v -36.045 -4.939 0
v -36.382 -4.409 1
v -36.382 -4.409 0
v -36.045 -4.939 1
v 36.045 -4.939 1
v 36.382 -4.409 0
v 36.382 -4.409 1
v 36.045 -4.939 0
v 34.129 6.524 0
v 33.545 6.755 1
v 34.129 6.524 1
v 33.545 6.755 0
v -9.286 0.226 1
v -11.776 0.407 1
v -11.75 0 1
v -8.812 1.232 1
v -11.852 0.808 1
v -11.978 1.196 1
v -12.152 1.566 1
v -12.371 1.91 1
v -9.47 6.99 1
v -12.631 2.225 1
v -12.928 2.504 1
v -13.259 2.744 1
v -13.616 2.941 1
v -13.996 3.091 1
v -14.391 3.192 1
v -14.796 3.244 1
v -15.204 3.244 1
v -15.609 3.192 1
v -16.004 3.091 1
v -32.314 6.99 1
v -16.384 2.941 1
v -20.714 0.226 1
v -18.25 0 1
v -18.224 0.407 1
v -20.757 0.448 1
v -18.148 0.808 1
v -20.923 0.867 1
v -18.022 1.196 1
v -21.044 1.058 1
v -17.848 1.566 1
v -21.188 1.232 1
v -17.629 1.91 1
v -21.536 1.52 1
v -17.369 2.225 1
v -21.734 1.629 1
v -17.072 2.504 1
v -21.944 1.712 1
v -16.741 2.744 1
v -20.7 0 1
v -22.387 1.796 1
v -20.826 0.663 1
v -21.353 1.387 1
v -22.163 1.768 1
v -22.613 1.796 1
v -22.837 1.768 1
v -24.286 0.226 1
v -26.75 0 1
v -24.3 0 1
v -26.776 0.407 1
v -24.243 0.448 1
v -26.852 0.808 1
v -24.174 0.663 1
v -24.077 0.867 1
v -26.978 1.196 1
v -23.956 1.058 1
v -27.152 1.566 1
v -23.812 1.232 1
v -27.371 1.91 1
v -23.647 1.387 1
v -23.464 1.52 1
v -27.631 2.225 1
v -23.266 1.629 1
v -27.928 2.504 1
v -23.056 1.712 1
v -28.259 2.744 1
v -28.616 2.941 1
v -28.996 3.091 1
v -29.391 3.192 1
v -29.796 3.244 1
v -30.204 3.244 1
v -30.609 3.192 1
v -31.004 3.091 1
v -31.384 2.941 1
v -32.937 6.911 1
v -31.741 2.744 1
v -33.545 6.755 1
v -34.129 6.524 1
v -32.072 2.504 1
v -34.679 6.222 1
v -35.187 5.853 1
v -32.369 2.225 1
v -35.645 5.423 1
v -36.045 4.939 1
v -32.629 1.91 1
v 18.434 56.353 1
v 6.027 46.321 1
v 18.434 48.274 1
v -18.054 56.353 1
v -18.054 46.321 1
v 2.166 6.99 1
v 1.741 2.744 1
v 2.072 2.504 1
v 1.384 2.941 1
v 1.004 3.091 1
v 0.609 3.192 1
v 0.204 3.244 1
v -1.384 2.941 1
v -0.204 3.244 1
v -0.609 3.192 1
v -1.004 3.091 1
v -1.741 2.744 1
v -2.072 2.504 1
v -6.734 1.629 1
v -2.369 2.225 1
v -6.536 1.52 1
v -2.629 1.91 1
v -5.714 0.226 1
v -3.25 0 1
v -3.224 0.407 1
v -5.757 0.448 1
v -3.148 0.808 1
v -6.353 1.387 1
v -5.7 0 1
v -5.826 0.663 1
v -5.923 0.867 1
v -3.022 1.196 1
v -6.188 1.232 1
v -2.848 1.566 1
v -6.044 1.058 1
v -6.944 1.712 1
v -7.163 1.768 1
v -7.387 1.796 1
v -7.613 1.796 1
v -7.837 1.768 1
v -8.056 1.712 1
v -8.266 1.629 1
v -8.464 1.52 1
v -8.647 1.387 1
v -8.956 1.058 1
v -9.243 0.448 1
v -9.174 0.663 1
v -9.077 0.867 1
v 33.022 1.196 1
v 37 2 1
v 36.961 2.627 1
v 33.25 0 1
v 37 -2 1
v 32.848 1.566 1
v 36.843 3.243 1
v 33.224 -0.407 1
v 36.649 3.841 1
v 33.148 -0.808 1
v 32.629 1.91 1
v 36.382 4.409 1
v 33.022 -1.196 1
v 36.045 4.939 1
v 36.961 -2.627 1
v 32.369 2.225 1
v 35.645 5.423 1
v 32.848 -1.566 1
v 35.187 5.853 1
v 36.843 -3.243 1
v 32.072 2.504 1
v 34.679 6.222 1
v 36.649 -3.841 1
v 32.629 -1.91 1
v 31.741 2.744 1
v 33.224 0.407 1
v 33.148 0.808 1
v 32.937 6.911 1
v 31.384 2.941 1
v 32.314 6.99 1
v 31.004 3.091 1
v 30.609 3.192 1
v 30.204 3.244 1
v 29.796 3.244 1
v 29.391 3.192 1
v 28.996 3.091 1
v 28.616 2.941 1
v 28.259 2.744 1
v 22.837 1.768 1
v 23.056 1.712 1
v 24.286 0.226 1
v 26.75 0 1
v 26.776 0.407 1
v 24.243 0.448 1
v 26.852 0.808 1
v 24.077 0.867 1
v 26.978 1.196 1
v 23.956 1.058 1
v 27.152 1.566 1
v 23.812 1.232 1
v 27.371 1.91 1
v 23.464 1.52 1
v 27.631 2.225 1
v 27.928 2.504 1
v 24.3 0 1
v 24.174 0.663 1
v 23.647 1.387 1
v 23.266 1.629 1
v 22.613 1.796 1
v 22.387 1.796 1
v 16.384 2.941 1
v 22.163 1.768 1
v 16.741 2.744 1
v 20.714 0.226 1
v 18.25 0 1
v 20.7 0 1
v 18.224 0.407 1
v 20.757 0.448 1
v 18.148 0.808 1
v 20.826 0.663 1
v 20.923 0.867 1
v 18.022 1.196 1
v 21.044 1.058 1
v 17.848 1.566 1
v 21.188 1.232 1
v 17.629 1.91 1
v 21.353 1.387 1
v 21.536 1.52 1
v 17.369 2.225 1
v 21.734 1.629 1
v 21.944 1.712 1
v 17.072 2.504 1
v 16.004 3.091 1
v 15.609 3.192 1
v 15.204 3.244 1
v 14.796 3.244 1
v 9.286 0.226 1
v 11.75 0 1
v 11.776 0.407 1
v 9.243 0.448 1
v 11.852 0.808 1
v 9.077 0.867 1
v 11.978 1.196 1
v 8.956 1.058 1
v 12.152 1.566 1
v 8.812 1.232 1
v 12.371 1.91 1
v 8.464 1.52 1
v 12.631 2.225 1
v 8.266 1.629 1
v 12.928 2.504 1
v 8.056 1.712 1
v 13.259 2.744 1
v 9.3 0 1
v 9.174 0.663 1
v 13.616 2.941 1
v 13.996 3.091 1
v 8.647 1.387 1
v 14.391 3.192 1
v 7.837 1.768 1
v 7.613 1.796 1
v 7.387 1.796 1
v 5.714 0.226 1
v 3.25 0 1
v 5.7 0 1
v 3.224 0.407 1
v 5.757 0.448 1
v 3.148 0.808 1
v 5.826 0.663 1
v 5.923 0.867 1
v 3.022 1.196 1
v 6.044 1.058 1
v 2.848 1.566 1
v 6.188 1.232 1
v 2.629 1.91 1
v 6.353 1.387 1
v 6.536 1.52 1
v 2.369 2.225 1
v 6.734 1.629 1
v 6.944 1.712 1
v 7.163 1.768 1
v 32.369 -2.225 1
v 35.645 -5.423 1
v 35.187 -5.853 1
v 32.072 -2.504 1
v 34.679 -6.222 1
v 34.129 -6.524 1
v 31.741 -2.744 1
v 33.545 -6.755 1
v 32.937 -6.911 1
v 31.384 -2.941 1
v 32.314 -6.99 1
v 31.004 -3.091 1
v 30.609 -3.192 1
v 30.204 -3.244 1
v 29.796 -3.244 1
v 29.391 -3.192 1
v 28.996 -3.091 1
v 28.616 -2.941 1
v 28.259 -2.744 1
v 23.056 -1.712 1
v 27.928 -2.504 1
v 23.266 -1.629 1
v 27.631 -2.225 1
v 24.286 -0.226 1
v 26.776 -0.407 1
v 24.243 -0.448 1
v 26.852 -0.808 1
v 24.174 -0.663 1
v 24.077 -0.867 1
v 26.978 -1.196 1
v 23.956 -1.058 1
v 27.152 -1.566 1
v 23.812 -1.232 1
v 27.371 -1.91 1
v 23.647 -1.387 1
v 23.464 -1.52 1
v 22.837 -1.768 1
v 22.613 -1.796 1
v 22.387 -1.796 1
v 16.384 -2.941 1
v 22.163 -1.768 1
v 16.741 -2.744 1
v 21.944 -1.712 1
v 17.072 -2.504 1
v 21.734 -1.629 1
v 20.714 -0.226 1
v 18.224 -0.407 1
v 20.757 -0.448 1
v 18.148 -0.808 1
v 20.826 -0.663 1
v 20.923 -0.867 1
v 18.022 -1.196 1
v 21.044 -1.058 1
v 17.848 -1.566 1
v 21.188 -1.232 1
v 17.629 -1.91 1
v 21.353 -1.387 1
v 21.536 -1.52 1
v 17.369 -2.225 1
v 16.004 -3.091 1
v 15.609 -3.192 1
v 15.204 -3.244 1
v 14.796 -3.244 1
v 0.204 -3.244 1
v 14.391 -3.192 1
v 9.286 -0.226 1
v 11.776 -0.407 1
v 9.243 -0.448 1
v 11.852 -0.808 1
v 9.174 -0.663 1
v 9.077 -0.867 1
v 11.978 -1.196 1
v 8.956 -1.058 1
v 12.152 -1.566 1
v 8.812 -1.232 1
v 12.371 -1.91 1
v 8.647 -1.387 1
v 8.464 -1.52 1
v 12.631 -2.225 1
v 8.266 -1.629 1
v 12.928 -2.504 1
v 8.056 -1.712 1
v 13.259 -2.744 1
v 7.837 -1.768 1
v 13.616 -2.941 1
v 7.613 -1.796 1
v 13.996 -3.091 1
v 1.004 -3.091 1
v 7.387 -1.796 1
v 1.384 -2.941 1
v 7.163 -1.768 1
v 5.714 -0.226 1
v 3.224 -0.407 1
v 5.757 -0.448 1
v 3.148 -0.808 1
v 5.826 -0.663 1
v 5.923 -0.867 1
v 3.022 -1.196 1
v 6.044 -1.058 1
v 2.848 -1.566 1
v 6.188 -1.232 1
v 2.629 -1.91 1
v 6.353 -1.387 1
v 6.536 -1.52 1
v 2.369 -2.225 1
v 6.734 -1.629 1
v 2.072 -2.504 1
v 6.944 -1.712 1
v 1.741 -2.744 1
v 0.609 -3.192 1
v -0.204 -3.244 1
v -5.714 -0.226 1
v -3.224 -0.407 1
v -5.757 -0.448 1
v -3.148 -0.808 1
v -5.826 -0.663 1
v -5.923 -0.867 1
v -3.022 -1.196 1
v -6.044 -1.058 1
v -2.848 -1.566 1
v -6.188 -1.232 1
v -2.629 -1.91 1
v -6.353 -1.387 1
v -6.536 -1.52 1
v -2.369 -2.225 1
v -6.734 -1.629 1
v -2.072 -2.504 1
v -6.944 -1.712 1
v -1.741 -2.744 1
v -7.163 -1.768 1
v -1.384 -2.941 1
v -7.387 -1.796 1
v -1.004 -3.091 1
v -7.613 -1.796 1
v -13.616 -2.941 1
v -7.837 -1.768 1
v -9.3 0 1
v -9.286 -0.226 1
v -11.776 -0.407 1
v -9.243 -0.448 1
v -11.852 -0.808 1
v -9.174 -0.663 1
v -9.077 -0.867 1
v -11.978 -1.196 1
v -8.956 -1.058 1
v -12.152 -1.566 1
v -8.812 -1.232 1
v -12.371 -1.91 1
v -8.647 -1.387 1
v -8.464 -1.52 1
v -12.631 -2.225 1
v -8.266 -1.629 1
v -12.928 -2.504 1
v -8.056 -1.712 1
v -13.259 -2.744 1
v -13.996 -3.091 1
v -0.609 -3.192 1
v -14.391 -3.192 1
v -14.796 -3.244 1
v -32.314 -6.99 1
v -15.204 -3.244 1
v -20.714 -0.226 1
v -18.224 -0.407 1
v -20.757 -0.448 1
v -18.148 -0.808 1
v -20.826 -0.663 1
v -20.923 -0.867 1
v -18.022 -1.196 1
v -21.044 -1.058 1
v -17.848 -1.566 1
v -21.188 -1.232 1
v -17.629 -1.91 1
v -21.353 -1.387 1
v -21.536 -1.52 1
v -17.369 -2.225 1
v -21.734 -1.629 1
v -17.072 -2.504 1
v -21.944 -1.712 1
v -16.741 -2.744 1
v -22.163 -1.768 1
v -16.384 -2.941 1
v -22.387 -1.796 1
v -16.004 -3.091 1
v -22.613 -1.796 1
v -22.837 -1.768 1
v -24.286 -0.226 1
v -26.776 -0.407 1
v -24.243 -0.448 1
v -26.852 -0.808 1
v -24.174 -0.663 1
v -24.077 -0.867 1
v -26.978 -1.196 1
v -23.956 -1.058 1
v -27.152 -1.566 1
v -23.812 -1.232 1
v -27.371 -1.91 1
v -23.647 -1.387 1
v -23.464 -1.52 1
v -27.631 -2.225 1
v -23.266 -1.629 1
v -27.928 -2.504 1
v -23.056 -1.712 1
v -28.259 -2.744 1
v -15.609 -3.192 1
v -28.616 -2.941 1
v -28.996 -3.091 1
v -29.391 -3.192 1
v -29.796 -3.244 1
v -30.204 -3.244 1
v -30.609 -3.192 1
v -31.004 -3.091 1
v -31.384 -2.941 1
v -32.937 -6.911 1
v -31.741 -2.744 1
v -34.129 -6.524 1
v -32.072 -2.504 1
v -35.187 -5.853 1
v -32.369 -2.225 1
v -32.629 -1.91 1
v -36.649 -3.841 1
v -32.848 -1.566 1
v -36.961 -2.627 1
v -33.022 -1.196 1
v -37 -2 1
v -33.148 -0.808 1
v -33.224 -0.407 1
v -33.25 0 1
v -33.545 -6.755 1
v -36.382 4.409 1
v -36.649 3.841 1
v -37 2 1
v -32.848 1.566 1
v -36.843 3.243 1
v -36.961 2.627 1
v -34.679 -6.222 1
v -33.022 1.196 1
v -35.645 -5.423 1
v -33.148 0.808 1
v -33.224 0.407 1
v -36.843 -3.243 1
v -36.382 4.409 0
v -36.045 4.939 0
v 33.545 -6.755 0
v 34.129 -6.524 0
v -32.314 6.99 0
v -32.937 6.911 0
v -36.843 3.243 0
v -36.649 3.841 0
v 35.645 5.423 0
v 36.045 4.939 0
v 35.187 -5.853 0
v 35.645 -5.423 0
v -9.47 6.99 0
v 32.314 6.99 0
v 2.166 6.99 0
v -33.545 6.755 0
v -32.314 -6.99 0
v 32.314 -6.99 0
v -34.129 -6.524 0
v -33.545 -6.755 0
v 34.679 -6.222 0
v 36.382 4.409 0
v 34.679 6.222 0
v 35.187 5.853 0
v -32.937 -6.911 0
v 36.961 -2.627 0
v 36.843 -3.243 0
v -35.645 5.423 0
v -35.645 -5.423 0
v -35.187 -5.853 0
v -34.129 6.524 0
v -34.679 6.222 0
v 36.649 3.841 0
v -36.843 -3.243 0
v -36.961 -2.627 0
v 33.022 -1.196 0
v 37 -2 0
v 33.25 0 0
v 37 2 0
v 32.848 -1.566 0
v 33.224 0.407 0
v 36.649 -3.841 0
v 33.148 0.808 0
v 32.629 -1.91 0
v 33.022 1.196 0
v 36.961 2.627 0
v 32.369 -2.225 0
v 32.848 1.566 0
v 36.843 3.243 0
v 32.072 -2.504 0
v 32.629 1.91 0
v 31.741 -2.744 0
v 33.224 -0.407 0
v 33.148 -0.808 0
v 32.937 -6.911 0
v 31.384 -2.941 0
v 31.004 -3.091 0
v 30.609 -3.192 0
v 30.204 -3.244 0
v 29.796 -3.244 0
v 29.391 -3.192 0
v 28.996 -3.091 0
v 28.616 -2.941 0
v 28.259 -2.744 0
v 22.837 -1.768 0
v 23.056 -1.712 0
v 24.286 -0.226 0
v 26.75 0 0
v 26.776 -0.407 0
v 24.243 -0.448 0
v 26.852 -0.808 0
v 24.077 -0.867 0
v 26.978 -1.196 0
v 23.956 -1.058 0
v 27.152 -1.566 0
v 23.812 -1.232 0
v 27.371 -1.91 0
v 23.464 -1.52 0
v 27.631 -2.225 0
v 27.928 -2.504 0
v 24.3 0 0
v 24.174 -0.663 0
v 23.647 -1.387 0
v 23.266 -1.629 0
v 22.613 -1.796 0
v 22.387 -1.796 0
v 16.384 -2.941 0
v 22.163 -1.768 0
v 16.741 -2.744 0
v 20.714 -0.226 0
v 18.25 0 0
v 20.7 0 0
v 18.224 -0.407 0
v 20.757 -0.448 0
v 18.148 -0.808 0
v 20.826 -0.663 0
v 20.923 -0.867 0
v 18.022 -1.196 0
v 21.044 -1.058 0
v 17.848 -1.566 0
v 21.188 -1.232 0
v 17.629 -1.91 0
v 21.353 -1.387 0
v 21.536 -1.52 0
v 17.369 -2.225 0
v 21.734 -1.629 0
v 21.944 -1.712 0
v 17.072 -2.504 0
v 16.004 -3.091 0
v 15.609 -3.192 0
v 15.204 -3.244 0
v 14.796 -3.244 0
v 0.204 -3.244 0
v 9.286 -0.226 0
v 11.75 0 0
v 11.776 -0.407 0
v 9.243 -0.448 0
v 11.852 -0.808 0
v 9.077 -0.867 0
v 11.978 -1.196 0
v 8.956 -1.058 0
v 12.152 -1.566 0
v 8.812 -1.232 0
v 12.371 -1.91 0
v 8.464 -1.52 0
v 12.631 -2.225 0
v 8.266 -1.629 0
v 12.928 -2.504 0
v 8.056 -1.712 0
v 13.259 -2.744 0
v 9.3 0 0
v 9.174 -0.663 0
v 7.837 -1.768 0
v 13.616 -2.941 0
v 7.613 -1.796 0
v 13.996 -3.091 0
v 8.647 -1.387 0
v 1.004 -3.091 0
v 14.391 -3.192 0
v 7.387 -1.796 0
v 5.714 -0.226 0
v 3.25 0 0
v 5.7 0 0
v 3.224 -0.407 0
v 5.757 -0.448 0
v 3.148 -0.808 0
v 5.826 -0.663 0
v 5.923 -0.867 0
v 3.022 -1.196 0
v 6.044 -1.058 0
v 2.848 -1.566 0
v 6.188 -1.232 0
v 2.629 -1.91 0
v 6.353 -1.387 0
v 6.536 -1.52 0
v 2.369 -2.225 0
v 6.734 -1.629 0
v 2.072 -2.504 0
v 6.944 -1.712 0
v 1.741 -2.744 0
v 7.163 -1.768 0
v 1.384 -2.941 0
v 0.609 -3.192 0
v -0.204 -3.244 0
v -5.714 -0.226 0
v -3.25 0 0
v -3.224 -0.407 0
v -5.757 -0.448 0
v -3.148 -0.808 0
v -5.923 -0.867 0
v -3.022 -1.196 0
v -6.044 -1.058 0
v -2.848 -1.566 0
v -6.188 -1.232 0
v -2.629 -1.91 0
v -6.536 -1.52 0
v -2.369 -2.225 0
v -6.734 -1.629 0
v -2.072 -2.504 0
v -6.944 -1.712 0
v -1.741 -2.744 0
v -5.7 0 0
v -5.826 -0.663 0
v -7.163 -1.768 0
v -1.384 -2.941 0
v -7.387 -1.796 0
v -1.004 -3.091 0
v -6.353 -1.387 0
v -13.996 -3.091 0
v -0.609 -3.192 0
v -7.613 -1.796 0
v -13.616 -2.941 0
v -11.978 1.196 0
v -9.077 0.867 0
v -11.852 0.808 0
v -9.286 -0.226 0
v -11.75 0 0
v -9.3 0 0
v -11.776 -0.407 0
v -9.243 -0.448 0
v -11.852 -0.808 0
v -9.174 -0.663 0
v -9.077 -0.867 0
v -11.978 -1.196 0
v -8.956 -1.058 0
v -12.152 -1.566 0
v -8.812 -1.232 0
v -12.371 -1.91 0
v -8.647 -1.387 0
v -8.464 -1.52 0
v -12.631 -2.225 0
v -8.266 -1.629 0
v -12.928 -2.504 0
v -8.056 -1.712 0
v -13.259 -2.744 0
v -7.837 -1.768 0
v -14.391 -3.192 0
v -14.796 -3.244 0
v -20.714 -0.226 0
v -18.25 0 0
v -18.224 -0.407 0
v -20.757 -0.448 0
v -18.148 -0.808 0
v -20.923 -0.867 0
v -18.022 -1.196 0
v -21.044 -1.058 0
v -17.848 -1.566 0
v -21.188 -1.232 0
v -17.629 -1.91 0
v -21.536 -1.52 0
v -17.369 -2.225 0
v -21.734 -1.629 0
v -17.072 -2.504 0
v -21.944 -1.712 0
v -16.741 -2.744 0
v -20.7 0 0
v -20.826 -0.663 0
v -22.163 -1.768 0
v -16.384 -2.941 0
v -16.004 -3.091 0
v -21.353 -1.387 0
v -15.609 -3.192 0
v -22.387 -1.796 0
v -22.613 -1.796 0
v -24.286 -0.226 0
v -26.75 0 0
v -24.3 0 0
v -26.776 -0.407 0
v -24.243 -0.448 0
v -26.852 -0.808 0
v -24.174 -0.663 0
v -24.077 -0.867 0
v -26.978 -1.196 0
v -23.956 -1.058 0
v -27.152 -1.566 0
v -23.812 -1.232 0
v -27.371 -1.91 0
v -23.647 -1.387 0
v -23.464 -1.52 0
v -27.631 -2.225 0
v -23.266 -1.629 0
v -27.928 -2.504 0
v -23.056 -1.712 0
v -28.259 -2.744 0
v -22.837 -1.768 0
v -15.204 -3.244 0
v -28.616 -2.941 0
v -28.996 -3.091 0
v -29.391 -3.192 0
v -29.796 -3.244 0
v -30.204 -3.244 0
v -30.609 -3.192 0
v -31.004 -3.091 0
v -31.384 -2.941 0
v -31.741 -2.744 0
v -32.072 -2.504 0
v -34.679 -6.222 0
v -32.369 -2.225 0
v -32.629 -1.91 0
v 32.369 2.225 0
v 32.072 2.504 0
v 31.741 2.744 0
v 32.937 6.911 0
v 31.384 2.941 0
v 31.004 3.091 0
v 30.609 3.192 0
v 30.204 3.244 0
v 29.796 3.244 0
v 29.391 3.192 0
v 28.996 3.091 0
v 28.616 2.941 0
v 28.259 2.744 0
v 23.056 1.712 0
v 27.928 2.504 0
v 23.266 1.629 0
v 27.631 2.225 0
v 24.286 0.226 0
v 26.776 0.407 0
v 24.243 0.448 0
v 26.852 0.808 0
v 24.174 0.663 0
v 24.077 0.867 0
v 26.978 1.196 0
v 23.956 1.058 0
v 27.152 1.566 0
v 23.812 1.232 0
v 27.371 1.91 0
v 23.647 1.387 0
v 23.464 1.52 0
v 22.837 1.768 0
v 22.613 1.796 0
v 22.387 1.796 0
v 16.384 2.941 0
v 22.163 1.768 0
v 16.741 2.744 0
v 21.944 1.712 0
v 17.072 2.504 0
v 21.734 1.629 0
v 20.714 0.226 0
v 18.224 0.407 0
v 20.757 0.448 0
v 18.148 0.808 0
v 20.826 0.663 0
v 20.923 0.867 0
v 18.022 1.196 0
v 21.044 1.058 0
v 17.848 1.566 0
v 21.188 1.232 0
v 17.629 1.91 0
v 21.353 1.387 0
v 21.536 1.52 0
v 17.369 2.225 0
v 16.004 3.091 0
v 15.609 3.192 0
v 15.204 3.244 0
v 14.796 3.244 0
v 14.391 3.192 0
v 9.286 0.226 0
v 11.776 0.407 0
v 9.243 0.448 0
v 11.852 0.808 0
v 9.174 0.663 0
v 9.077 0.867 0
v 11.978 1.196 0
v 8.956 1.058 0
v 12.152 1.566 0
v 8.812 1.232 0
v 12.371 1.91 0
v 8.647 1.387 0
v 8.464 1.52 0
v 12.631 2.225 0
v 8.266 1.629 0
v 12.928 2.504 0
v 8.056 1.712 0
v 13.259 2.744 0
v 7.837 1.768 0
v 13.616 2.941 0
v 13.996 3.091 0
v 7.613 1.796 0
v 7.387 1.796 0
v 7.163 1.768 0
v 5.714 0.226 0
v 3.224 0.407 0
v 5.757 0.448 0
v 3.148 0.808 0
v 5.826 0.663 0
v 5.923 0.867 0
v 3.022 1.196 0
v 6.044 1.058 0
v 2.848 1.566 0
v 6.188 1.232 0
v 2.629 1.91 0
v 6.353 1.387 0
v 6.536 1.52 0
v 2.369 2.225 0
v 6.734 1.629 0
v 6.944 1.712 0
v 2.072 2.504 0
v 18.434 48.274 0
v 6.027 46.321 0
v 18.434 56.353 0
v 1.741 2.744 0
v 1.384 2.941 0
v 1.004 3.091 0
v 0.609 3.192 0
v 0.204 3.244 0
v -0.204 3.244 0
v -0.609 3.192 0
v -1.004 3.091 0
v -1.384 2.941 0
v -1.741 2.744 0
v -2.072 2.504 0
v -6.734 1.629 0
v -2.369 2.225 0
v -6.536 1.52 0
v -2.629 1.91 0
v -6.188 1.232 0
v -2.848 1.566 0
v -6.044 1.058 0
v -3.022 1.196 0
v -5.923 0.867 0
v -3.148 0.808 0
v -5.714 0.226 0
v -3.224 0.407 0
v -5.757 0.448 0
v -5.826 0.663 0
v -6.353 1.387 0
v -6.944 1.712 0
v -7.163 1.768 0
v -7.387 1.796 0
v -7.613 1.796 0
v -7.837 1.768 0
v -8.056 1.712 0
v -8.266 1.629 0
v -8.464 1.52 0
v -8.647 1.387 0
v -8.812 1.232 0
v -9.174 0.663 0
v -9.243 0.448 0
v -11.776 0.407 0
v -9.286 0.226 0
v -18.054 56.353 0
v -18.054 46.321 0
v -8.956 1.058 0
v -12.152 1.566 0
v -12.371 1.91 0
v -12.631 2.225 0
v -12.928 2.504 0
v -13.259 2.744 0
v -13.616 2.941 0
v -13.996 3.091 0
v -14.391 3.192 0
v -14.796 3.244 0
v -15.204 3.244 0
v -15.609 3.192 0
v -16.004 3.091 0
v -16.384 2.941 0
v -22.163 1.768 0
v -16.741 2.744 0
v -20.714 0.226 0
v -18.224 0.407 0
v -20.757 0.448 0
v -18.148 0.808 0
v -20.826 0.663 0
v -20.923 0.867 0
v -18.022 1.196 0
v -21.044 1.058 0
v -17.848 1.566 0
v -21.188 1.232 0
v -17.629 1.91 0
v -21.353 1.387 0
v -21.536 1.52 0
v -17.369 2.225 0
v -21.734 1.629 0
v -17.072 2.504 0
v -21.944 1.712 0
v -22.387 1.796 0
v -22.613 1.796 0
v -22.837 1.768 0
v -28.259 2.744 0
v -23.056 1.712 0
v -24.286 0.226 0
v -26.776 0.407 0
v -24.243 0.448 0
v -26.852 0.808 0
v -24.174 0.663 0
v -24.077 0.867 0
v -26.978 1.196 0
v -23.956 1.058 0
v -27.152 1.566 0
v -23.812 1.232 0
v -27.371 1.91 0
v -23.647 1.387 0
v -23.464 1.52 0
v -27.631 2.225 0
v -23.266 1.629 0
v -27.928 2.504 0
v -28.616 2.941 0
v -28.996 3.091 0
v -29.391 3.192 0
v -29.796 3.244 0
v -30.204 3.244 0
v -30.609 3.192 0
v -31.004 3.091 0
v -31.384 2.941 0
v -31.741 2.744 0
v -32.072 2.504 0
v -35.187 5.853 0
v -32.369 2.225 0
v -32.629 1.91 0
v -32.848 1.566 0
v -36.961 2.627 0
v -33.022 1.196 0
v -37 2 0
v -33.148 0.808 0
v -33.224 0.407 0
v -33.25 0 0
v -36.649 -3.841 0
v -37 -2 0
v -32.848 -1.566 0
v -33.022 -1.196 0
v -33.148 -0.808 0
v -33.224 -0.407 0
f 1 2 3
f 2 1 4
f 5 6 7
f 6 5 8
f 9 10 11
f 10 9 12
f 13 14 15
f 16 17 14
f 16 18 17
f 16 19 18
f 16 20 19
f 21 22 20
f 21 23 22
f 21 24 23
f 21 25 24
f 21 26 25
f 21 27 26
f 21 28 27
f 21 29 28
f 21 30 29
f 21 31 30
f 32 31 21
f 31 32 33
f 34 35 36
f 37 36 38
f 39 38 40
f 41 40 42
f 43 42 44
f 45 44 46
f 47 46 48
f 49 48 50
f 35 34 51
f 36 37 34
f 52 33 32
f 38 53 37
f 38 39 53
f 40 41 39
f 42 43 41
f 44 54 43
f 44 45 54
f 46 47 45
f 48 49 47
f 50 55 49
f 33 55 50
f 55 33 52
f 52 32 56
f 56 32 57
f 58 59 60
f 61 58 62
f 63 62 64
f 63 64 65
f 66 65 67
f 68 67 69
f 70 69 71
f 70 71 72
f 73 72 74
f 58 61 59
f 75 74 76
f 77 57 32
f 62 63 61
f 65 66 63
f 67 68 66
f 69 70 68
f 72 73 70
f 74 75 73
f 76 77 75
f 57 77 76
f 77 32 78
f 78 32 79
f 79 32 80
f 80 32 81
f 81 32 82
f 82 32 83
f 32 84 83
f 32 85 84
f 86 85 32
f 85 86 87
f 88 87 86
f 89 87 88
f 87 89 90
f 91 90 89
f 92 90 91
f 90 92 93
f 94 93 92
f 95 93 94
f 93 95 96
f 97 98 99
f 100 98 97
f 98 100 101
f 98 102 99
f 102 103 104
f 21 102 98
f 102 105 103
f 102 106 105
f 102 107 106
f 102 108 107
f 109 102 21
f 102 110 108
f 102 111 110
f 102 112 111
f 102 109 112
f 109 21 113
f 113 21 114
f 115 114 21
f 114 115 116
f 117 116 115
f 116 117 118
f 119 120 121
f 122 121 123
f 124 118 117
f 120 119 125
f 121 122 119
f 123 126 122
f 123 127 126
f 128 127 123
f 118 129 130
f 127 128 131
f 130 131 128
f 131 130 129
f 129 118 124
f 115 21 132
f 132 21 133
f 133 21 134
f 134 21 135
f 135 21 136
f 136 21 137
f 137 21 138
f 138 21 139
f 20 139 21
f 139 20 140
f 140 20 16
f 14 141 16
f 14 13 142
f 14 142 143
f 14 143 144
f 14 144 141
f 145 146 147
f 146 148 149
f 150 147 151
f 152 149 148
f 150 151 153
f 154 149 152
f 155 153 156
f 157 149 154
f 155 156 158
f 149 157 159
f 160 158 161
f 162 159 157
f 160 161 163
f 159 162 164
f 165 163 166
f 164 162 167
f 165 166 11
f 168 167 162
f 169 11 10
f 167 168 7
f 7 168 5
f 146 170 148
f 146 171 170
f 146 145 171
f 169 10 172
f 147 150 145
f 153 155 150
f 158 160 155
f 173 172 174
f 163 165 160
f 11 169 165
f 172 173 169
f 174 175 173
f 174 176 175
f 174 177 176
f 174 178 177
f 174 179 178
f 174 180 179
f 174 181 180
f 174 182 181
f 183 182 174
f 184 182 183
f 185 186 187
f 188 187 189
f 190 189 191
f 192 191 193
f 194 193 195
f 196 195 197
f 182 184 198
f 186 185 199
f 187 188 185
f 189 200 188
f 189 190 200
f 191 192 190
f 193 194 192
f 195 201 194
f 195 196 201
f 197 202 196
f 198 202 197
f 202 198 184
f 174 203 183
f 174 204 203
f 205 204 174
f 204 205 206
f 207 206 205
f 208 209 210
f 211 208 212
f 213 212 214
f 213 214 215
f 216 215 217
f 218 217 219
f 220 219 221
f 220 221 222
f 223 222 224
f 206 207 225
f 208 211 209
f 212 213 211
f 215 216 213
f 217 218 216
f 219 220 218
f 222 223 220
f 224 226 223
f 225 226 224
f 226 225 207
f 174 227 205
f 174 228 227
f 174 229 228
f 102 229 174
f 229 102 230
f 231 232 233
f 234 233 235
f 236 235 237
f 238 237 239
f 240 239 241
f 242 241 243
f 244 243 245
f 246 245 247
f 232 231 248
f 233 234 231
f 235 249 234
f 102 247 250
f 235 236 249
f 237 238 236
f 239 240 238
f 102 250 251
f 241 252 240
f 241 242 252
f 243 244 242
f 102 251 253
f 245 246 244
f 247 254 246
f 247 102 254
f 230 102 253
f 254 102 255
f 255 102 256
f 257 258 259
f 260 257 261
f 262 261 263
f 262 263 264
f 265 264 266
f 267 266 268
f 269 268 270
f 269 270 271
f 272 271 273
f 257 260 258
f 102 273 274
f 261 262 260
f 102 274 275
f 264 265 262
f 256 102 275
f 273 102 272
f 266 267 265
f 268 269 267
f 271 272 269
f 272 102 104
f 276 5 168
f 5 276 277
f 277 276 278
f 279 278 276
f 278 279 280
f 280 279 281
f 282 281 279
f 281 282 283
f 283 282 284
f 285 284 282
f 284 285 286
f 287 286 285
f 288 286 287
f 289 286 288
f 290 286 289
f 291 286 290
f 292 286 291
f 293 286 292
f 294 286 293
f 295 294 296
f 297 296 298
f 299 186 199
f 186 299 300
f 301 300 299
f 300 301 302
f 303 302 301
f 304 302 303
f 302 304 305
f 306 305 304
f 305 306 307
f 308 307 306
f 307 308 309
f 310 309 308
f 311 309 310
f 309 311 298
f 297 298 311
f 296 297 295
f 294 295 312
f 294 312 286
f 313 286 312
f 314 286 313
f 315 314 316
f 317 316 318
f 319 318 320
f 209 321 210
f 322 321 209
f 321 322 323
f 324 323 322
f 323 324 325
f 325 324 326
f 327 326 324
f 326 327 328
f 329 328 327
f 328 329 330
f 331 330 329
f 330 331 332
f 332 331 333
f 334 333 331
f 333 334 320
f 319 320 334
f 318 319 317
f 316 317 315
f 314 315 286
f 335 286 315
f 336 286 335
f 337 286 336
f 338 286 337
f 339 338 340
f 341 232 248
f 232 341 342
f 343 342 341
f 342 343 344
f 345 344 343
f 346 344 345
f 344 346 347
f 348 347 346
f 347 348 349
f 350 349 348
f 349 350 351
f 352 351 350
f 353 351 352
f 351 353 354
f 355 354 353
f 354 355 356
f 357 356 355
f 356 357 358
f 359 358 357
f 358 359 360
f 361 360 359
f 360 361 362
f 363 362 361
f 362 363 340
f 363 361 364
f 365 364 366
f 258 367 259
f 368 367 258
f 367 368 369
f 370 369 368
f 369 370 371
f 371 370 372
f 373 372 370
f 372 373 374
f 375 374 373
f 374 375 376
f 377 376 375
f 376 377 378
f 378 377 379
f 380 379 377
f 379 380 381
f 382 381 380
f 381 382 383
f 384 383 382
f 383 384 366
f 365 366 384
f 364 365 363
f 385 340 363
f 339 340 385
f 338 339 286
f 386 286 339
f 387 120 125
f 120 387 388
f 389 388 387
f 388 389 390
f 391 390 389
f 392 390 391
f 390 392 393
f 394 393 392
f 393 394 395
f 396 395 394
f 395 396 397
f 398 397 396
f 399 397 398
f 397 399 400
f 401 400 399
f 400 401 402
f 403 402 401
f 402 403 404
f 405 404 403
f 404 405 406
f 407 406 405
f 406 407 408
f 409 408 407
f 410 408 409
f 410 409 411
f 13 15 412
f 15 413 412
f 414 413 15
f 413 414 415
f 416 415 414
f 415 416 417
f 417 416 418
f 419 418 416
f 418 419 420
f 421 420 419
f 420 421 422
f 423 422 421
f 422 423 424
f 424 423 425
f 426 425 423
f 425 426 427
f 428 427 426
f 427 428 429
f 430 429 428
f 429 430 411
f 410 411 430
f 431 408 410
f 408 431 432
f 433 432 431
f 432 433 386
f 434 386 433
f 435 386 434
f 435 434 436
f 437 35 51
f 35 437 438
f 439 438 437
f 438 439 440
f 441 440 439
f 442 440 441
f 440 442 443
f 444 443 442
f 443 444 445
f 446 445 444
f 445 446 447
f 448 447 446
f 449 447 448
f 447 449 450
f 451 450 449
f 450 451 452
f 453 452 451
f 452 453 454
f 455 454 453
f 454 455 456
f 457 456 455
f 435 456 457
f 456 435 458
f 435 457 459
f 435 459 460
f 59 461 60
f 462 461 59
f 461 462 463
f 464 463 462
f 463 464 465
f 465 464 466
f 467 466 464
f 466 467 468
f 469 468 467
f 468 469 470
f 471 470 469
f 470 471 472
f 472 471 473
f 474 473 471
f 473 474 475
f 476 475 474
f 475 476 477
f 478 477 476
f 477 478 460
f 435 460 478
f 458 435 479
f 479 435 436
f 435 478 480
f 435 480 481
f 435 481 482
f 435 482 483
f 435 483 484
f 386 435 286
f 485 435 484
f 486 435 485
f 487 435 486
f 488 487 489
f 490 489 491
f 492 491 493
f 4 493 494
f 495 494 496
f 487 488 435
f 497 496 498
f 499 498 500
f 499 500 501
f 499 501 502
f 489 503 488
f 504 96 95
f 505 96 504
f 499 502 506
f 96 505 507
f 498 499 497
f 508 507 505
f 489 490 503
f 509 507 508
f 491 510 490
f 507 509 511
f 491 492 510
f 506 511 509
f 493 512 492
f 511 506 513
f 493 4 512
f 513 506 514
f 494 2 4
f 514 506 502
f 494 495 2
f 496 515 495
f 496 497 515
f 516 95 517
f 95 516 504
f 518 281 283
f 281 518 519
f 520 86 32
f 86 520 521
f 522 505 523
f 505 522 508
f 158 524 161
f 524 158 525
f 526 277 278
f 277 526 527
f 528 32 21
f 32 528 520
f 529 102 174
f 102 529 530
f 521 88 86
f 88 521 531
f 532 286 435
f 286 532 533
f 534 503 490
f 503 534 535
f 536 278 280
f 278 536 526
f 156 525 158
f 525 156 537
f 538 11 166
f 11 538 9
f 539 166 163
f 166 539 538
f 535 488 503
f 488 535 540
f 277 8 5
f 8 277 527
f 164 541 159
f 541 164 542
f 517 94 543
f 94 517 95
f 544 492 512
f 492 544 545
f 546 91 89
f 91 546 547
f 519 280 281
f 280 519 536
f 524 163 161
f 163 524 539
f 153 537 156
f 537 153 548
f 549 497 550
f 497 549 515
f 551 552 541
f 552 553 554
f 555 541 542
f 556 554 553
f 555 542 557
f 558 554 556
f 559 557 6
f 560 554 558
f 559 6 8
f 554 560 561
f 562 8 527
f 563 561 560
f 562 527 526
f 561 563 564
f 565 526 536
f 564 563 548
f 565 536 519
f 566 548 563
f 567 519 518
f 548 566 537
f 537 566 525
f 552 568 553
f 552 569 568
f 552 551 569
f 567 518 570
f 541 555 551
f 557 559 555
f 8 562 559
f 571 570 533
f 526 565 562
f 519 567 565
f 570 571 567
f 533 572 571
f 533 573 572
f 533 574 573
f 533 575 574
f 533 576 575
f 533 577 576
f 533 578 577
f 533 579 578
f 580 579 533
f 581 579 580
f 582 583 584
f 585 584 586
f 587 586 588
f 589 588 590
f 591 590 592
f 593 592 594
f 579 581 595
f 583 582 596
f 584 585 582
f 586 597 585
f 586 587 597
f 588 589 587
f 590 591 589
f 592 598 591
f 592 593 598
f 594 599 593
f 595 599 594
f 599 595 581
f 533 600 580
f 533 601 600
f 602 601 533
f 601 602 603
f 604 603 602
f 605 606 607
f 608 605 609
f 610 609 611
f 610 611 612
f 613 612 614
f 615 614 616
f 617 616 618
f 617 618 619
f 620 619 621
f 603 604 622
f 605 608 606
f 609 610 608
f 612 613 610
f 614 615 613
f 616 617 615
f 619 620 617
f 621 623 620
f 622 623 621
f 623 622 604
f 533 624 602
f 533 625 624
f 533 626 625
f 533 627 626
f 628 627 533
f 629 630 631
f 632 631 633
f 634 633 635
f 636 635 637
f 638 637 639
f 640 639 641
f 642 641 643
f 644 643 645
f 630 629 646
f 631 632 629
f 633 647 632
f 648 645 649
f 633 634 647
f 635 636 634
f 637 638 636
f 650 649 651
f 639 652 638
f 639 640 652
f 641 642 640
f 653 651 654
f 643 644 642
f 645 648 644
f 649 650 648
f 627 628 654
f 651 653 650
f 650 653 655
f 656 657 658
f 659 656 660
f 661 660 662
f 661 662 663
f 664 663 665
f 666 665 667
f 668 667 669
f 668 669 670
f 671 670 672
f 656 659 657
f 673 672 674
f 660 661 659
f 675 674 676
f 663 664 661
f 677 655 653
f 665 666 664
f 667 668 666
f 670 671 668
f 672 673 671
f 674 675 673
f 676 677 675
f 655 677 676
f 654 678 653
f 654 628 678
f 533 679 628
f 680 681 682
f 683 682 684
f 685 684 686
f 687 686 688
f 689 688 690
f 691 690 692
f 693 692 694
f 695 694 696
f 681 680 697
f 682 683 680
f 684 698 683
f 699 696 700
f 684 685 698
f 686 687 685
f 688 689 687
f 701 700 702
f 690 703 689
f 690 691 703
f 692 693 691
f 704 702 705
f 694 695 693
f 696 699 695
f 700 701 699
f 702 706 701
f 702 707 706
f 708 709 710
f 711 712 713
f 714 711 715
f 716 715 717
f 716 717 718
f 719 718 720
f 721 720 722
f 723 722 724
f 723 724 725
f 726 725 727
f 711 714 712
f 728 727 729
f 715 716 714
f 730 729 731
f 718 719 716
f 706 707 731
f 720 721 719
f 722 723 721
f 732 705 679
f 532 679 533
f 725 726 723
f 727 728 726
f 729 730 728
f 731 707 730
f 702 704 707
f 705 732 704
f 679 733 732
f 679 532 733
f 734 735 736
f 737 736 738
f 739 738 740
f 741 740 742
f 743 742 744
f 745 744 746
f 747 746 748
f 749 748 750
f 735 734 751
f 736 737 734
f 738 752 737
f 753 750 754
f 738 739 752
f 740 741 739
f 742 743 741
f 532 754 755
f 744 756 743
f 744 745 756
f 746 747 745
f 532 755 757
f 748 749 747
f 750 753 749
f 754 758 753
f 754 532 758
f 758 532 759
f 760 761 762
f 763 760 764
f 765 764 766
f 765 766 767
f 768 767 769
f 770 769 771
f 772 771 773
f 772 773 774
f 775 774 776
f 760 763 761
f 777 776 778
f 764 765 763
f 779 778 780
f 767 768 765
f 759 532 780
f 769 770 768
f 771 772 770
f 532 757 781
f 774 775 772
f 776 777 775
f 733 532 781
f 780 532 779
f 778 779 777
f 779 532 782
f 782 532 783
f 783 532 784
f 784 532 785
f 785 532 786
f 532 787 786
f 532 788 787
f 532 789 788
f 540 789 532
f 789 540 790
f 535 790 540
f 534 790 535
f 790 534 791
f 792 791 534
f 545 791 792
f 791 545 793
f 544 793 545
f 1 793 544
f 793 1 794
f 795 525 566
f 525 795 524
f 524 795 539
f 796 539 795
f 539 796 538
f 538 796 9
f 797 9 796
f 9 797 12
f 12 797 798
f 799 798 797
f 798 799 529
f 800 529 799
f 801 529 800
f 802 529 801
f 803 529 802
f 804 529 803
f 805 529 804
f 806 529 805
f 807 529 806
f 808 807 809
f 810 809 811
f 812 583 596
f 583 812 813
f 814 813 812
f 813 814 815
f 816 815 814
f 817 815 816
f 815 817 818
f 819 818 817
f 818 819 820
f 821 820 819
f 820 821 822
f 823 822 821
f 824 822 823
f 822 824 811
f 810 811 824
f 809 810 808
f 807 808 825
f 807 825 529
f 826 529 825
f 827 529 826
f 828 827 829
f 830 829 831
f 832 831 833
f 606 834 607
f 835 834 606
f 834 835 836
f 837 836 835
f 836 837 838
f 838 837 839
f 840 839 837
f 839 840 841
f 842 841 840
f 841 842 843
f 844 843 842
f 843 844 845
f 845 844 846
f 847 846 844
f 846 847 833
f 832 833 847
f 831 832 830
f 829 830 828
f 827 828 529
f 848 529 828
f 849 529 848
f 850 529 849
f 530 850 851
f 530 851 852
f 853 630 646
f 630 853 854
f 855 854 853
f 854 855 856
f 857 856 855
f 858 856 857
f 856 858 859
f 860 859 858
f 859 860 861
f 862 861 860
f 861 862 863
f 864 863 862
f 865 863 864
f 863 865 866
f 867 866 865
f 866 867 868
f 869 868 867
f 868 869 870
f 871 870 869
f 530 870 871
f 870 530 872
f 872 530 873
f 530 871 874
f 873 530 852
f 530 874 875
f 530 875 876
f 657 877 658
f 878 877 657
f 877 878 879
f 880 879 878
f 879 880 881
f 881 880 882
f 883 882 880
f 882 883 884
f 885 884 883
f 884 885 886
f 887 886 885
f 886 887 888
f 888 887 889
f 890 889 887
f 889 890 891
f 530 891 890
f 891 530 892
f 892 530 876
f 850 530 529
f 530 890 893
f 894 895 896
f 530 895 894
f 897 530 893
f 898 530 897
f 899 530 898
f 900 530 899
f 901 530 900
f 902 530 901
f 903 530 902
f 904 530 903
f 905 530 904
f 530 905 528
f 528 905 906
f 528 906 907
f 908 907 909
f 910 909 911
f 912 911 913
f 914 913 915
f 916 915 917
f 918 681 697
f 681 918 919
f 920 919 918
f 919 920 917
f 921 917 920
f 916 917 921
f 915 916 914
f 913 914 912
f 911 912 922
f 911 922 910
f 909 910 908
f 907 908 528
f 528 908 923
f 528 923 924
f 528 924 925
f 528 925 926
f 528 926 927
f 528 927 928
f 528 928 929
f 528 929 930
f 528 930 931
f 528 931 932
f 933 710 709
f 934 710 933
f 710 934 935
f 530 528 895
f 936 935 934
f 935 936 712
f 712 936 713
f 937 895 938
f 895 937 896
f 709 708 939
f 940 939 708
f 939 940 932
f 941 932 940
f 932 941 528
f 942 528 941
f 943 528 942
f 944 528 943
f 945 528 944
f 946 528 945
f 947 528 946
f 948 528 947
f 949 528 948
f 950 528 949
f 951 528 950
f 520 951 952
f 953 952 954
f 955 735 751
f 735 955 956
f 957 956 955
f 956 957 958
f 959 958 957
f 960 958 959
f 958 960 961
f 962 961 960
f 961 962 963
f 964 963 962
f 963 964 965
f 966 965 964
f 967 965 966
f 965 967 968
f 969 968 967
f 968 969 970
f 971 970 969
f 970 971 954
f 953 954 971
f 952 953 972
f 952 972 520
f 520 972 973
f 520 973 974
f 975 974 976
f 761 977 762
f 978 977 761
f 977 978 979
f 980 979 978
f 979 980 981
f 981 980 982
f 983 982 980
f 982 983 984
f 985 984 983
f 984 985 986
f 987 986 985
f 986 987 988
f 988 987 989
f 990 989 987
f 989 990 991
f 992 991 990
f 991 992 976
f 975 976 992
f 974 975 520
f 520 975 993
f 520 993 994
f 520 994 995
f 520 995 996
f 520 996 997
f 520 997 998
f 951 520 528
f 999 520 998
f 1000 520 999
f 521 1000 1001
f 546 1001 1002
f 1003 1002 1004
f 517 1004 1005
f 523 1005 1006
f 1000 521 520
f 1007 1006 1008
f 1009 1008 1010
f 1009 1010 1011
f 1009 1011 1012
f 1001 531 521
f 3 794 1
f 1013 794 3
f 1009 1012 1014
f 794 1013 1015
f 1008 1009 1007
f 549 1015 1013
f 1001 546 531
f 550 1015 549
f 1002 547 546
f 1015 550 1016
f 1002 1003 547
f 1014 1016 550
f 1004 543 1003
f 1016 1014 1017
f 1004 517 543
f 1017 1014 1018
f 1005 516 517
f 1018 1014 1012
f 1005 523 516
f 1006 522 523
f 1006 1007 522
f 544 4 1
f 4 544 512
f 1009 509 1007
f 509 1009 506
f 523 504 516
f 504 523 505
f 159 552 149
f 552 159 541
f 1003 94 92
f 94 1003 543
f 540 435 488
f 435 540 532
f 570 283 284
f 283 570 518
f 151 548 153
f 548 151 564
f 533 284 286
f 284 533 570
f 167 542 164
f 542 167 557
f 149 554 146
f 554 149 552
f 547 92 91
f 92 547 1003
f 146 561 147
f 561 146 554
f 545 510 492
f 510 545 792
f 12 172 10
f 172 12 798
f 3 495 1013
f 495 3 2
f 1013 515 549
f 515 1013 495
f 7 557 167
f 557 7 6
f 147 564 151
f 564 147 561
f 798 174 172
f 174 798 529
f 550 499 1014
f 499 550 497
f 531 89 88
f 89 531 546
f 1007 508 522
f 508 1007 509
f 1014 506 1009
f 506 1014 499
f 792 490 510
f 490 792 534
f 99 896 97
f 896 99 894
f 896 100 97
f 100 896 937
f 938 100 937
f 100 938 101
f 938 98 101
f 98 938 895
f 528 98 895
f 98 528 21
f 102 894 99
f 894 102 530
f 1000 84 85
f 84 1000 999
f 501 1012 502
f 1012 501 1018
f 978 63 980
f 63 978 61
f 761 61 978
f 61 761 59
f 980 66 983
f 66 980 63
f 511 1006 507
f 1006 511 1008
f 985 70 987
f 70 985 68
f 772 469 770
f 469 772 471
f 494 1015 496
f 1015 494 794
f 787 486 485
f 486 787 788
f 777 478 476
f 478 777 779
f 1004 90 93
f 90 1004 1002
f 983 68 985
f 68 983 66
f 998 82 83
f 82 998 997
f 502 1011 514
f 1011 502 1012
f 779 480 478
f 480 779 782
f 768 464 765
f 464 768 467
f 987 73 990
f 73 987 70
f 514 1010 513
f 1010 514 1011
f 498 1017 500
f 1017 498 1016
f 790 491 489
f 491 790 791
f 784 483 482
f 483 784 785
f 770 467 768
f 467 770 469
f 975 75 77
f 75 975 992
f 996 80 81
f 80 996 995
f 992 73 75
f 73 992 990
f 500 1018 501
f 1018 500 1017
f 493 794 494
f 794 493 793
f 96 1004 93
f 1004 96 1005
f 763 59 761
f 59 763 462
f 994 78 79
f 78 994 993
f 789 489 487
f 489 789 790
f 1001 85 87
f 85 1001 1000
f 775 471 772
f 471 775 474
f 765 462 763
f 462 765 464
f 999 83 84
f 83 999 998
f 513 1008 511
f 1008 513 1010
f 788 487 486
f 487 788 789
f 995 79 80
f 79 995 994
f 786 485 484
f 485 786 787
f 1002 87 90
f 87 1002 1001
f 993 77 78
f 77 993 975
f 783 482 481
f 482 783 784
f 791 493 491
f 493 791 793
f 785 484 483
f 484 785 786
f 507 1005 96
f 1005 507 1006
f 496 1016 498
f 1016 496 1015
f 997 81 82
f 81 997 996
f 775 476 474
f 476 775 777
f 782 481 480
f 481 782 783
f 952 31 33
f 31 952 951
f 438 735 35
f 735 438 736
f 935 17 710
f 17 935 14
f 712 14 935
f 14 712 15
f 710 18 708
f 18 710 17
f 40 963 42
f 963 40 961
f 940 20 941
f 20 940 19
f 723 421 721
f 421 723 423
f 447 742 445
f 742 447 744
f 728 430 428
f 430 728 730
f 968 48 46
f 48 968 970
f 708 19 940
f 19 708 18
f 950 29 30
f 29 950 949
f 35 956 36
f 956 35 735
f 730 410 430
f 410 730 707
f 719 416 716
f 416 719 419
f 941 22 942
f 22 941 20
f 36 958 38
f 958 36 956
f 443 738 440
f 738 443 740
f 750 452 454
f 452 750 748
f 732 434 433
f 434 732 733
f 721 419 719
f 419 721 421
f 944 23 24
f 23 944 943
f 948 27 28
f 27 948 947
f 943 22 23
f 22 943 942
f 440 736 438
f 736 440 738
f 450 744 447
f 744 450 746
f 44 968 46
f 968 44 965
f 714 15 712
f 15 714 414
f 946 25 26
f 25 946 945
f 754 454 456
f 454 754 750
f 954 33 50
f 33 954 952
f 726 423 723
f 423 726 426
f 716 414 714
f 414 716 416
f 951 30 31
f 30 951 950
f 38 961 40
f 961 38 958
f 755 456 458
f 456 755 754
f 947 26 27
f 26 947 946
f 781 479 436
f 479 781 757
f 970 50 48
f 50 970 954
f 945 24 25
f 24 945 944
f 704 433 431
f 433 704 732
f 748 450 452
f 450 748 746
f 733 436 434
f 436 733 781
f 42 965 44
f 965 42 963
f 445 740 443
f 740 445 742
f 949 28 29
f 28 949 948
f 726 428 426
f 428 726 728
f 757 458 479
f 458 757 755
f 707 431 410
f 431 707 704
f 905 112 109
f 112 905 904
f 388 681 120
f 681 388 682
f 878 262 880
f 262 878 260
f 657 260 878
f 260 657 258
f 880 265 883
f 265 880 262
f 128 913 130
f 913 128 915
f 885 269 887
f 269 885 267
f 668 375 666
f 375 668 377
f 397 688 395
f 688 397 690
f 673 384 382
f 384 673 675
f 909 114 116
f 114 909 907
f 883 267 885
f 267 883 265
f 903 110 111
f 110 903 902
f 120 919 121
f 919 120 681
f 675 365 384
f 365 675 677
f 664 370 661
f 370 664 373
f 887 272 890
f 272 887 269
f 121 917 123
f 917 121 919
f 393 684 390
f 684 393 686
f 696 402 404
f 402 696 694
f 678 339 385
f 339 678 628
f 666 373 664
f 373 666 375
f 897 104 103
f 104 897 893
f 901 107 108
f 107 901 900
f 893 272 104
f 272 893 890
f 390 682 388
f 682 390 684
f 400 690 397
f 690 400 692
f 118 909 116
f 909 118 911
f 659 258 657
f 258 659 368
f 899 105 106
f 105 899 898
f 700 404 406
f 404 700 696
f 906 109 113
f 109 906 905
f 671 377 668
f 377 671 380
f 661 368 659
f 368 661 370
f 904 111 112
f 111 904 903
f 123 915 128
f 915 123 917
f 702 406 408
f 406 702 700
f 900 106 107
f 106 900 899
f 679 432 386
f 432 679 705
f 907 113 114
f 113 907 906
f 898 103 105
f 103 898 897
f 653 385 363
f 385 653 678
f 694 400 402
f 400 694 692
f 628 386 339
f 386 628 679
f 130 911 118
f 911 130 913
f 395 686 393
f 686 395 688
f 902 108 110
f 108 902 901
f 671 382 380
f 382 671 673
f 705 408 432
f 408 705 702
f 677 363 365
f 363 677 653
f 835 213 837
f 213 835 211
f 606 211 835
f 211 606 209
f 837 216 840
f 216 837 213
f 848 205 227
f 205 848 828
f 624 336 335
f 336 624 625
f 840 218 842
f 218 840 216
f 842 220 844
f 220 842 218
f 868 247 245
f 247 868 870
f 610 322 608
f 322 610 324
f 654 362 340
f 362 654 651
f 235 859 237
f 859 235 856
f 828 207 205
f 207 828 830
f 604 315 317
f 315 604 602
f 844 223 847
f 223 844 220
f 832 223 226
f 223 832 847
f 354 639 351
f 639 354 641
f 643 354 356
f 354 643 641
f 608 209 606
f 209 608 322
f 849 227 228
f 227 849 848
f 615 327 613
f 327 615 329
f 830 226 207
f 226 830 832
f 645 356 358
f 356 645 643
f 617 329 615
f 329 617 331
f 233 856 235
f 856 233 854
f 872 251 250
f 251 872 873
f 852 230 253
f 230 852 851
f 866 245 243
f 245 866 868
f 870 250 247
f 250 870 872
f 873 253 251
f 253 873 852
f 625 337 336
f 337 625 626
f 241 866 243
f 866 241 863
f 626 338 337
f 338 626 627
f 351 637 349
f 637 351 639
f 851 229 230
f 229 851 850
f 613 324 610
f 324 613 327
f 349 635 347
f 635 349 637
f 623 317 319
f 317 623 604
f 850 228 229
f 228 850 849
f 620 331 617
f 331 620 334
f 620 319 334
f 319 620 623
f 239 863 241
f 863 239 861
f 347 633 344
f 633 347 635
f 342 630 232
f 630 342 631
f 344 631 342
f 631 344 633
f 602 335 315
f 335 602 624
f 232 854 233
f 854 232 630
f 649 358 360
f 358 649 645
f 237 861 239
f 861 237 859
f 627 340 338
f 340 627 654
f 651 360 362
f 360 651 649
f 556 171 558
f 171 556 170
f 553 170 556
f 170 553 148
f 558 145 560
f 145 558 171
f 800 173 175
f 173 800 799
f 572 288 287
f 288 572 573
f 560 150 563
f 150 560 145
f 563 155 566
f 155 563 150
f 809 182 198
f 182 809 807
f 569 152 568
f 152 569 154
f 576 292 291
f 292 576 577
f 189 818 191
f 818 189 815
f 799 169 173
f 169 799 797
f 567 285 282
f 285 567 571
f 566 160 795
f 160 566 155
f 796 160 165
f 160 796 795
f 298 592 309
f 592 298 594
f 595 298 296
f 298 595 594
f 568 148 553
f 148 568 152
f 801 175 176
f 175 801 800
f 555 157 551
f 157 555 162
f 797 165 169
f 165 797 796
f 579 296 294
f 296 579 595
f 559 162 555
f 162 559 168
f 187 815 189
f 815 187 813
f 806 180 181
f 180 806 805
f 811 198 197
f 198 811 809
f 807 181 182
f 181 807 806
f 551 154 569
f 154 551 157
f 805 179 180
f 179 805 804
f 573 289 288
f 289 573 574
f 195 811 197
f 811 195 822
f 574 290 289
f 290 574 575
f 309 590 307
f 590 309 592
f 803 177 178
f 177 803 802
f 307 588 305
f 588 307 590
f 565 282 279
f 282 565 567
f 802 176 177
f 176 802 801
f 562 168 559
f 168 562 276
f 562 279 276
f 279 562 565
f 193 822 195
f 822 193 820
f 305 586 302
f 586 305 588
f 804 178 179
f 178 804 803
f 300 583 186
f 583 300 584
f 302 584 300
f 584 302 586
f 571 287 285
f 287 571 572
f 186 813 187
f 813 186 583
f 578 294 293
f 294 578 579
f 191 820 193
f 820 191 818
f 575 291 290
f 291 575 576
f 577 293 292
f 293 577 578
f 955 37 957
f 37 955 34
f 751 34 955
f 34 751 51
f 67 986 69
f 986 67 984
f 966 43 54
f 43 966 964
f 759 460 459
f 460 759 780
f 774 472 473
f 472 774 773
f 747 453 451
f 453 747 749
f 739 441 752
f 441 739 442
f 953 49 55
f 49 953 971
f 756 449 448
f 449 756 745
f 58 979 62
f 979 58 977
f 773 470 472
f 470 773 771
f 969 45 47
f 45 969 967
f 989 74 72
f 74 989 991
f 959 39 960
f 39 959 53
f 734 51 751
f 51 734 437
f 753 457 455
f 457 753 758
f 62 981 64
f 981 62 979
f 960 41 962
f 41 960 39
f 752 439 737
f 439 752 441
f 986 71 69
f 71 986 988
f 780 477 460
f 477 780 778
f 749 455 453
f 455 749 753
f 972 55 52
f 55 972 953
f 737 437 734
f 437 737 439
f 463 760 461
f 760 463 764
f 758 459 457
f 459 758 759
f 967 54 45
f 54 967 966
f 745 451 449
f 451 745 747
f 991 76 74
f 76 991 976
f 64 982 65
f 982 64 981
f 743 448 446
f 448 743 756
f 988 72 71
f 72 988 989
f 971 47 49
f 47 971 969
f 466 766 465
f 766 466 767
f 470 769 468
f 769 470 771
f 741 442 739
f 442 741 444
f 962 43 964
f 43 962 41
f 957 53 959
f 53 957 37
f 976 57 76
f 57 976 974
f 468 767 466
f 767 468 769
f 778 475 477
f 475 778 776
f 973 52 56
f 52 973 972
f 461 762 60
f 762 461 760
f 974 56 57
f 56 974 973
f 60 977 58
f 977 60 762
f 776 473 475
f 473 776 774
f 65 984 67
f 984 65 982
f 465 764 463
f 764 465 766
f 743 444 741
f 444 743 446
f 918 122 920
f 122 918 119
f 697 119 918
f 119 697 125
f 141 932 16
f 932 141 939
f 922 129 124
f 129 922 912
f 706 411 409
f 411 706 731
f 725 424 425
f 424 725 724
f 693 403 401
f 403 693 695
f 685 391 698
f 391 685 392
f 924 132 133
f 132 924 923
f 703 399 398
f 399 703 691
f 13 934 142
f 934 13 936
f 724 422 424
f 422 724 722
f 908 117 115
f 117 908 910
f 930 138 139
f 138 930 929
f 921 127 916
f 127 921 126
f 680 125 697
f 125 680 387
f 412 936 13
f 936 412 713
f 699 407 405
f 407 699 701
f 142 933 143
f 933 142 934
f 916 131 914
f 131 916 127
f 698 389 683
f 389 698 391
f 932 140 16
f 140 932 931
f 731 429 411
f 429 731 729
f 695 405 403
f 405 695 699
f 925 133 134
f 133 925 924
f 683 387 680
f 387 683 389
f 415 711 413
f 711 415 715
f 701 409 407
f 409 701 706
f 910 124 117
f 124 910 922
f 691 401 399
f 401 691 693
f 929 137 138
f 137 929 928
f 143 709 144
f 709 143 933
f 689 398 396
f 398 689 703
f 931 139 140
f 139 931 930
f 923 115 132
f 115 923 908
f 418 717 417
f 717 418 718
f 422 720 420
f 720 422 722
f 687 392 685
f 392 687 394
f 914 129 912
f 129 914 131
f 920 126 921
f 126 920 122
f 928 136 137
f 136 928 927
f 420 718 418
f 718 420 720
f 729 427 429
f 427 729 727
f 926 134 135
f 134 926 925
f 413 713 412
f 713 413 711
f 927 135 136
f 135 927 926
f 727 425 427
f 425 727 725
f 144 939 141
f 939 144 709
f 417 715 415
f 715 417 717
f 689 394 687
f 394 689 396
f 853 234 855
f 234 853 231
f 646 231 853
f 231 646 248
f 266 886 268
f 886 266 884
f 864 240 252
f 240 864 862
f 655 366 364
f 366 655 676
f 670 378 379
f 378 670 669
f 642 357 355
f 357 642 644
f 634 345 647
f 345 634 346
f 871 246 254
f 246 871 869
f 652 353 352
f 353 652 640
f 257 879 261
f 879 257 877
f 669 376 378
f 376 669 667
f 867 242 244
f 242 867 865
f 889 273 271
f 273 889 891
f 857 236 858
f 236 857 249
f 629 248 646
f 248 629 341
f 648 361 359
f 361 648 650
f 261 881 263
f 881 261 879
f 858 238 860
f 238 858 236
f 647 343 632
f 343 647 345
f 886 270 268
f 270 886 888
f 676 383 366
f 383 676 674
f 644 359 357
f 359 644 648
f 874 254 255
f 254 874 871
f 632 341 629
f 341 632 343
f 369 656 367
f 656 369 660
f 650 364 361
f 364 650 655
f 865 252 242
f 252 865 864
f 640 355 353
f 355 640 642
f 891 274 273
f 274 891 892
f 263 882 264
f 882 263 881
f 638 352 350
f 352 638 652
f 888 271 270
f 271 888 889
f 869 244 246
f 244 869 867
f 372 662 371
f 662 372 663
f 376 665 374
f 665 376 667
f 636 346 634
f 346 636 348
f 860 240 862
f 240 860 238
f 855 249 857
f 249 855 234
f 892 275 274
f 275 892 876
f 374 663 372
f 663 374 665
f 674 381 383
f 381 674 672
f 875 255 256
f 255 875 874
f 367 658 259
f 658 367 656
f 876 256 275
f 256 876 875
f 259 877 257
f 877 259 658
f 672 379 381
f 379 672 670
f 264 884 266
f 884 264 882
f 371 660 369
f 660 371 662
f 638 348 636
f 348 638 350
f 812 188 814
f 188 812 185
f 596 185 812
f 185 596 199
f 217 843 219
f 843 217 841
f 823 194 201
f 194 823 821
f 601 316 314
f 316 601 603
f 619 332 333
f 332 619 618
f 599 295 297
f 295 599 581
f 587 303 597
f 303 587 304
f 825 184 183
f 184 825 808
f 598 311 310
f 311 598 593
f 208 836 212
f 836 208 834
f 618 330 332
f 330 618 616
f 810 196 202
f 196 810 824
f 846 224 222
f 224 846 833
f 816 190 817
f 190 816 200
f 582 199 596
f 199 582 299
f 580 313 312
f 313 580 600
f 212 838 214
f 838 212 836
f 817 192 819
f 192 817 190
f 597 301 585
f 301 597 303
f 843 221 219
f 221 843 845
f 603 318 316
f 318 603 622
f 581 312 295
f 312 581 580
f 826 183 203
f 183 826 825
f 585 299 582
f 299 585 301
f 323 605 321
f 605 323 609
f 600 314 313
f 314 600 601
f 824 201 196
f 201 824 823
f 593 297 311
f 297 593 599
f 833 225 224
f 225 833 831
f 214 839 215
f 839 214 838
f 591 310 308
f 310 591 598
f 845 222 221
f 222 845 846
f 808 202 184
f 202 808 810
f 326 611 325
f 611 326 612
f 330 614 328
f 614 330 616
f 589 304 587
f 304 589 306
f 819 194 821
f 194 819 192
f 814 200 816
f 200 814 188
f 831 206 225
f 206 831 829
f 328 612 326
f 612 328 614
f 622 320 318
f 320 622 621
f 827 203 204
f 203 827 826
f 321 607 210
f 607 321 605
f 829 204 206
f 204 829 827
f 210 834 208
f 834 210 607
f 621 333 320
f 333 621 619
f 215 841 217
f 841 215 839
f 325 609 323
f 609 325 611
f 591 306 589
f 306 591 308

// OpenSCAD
$fn = 50;


difference() {
	union() {
		hull() {
			translate(v = [-32.0000000000, 2.0000000000, 0]) {
				cylinder(h = 1, r = 5);
			}
			translate(v = [32.0000000000, 2.0000000000, 0]) {
				cylinder(h = 1, r = 5);
			}
			translate(v = [-32.0000000000, -2.0000000000, 0]) {
				cylinder(h = 1, r = 5);
			}
			translate(v = [32.0000000000, -2.0000000000, 0]) {
				cylinder(h = 1, r = 5);
			}
		}
		translate(v = [0, 55, 0]) {
			linear_extrude(height = 1) {
				text(font = "DejaVu Sans Mono:style=Bold", halign = "center", size = 57.0000000000, text = "7", valign = "top");
			}
		}
	}
	union() {
		translate(v = [-30.0000000000, 0.0000000000, 0]) {
			translate(v = [0, 0, -100]) {
				cylinder(h = 200, r = 3.2500000000);
			}
		}
		translate(v = [-15.0000000000, 0.0000000000, 0]) {
			translate(v = [0, 0, -100]) {
				cylinder(h = 200, r = 3.2500000000);
			}
		}
		translate(v = [0, 0, -100]) {
			cylinder(h = 200, r = 3.2500000000);
		}
		translate(v = [15.0000000000, 0.0000000000, 0]) {
			translate(v = [0, 0, -100]) {
				cylinder(h = 200, r = 3.2500000000);
			}
		}
		translate(v = [30.0000000000, 0.0000000000, 0]) {
			translate(v = [0, 0, -100]) {
				cylinder(h = 200, r = 3.2500000000);
			}
		}
		translate(v = [-30.0000000000, 0.0000000000, 0]) {
			translate(v = [0, 0, -100]) {
				cylinder(h = 200, r = 1.8000000000);
			}
		}
		translate(v = [-22.5000000000, 0.0000000000, 0]) {
			translate(v = [0, 0, -100]) {
				cylinder(h = 200, r = 1.8000000000);
			}
		}
		translate(v = [-15.0000000000, 0.0000000000, 0]) {
			translate(v = [0, 0, -100]) {
				cylinder(h = 200, r = 1.8000000000);
			}
		}
		translate(v = [-7.5000000000, 0.0000000000, 0]) {
			translate(v = [0, 0, -100]) {
				cylinder(h = 200, r = 1.8000000000);
			}
		}
		translate(v = [0, 0, -100]) {
			cylinder(h = 200, r = 1.8000000000);
		}
		translate(v = [7.5000000000, 0.0000000000, 0]) {
			translate(v = [0, 0, -100]) {
				cylinder(h = 200, r = 1.8000000000);
			}
		}
		translate(v = [15.0000000000, 0.0000000000, 0]) {
			translate(v = [0, 0, -100]) {
				cylinder(h = 200, r = 1.8000000000);
			}
		}
		translate(v = [22.5000000000, 0.0000000000, 0]) {
			translate(v = [0, 0, -100]) {
				cylinder(h = 200, r = 1.8000000000);
			}
		}
		translate(v = [30.0000000000, 0.0000000000, 0]) {
			translate(v = [0, 0, -100]) {
				cylinder(h = 200, r = 1.8000000000);
			}
		}
	}
}
